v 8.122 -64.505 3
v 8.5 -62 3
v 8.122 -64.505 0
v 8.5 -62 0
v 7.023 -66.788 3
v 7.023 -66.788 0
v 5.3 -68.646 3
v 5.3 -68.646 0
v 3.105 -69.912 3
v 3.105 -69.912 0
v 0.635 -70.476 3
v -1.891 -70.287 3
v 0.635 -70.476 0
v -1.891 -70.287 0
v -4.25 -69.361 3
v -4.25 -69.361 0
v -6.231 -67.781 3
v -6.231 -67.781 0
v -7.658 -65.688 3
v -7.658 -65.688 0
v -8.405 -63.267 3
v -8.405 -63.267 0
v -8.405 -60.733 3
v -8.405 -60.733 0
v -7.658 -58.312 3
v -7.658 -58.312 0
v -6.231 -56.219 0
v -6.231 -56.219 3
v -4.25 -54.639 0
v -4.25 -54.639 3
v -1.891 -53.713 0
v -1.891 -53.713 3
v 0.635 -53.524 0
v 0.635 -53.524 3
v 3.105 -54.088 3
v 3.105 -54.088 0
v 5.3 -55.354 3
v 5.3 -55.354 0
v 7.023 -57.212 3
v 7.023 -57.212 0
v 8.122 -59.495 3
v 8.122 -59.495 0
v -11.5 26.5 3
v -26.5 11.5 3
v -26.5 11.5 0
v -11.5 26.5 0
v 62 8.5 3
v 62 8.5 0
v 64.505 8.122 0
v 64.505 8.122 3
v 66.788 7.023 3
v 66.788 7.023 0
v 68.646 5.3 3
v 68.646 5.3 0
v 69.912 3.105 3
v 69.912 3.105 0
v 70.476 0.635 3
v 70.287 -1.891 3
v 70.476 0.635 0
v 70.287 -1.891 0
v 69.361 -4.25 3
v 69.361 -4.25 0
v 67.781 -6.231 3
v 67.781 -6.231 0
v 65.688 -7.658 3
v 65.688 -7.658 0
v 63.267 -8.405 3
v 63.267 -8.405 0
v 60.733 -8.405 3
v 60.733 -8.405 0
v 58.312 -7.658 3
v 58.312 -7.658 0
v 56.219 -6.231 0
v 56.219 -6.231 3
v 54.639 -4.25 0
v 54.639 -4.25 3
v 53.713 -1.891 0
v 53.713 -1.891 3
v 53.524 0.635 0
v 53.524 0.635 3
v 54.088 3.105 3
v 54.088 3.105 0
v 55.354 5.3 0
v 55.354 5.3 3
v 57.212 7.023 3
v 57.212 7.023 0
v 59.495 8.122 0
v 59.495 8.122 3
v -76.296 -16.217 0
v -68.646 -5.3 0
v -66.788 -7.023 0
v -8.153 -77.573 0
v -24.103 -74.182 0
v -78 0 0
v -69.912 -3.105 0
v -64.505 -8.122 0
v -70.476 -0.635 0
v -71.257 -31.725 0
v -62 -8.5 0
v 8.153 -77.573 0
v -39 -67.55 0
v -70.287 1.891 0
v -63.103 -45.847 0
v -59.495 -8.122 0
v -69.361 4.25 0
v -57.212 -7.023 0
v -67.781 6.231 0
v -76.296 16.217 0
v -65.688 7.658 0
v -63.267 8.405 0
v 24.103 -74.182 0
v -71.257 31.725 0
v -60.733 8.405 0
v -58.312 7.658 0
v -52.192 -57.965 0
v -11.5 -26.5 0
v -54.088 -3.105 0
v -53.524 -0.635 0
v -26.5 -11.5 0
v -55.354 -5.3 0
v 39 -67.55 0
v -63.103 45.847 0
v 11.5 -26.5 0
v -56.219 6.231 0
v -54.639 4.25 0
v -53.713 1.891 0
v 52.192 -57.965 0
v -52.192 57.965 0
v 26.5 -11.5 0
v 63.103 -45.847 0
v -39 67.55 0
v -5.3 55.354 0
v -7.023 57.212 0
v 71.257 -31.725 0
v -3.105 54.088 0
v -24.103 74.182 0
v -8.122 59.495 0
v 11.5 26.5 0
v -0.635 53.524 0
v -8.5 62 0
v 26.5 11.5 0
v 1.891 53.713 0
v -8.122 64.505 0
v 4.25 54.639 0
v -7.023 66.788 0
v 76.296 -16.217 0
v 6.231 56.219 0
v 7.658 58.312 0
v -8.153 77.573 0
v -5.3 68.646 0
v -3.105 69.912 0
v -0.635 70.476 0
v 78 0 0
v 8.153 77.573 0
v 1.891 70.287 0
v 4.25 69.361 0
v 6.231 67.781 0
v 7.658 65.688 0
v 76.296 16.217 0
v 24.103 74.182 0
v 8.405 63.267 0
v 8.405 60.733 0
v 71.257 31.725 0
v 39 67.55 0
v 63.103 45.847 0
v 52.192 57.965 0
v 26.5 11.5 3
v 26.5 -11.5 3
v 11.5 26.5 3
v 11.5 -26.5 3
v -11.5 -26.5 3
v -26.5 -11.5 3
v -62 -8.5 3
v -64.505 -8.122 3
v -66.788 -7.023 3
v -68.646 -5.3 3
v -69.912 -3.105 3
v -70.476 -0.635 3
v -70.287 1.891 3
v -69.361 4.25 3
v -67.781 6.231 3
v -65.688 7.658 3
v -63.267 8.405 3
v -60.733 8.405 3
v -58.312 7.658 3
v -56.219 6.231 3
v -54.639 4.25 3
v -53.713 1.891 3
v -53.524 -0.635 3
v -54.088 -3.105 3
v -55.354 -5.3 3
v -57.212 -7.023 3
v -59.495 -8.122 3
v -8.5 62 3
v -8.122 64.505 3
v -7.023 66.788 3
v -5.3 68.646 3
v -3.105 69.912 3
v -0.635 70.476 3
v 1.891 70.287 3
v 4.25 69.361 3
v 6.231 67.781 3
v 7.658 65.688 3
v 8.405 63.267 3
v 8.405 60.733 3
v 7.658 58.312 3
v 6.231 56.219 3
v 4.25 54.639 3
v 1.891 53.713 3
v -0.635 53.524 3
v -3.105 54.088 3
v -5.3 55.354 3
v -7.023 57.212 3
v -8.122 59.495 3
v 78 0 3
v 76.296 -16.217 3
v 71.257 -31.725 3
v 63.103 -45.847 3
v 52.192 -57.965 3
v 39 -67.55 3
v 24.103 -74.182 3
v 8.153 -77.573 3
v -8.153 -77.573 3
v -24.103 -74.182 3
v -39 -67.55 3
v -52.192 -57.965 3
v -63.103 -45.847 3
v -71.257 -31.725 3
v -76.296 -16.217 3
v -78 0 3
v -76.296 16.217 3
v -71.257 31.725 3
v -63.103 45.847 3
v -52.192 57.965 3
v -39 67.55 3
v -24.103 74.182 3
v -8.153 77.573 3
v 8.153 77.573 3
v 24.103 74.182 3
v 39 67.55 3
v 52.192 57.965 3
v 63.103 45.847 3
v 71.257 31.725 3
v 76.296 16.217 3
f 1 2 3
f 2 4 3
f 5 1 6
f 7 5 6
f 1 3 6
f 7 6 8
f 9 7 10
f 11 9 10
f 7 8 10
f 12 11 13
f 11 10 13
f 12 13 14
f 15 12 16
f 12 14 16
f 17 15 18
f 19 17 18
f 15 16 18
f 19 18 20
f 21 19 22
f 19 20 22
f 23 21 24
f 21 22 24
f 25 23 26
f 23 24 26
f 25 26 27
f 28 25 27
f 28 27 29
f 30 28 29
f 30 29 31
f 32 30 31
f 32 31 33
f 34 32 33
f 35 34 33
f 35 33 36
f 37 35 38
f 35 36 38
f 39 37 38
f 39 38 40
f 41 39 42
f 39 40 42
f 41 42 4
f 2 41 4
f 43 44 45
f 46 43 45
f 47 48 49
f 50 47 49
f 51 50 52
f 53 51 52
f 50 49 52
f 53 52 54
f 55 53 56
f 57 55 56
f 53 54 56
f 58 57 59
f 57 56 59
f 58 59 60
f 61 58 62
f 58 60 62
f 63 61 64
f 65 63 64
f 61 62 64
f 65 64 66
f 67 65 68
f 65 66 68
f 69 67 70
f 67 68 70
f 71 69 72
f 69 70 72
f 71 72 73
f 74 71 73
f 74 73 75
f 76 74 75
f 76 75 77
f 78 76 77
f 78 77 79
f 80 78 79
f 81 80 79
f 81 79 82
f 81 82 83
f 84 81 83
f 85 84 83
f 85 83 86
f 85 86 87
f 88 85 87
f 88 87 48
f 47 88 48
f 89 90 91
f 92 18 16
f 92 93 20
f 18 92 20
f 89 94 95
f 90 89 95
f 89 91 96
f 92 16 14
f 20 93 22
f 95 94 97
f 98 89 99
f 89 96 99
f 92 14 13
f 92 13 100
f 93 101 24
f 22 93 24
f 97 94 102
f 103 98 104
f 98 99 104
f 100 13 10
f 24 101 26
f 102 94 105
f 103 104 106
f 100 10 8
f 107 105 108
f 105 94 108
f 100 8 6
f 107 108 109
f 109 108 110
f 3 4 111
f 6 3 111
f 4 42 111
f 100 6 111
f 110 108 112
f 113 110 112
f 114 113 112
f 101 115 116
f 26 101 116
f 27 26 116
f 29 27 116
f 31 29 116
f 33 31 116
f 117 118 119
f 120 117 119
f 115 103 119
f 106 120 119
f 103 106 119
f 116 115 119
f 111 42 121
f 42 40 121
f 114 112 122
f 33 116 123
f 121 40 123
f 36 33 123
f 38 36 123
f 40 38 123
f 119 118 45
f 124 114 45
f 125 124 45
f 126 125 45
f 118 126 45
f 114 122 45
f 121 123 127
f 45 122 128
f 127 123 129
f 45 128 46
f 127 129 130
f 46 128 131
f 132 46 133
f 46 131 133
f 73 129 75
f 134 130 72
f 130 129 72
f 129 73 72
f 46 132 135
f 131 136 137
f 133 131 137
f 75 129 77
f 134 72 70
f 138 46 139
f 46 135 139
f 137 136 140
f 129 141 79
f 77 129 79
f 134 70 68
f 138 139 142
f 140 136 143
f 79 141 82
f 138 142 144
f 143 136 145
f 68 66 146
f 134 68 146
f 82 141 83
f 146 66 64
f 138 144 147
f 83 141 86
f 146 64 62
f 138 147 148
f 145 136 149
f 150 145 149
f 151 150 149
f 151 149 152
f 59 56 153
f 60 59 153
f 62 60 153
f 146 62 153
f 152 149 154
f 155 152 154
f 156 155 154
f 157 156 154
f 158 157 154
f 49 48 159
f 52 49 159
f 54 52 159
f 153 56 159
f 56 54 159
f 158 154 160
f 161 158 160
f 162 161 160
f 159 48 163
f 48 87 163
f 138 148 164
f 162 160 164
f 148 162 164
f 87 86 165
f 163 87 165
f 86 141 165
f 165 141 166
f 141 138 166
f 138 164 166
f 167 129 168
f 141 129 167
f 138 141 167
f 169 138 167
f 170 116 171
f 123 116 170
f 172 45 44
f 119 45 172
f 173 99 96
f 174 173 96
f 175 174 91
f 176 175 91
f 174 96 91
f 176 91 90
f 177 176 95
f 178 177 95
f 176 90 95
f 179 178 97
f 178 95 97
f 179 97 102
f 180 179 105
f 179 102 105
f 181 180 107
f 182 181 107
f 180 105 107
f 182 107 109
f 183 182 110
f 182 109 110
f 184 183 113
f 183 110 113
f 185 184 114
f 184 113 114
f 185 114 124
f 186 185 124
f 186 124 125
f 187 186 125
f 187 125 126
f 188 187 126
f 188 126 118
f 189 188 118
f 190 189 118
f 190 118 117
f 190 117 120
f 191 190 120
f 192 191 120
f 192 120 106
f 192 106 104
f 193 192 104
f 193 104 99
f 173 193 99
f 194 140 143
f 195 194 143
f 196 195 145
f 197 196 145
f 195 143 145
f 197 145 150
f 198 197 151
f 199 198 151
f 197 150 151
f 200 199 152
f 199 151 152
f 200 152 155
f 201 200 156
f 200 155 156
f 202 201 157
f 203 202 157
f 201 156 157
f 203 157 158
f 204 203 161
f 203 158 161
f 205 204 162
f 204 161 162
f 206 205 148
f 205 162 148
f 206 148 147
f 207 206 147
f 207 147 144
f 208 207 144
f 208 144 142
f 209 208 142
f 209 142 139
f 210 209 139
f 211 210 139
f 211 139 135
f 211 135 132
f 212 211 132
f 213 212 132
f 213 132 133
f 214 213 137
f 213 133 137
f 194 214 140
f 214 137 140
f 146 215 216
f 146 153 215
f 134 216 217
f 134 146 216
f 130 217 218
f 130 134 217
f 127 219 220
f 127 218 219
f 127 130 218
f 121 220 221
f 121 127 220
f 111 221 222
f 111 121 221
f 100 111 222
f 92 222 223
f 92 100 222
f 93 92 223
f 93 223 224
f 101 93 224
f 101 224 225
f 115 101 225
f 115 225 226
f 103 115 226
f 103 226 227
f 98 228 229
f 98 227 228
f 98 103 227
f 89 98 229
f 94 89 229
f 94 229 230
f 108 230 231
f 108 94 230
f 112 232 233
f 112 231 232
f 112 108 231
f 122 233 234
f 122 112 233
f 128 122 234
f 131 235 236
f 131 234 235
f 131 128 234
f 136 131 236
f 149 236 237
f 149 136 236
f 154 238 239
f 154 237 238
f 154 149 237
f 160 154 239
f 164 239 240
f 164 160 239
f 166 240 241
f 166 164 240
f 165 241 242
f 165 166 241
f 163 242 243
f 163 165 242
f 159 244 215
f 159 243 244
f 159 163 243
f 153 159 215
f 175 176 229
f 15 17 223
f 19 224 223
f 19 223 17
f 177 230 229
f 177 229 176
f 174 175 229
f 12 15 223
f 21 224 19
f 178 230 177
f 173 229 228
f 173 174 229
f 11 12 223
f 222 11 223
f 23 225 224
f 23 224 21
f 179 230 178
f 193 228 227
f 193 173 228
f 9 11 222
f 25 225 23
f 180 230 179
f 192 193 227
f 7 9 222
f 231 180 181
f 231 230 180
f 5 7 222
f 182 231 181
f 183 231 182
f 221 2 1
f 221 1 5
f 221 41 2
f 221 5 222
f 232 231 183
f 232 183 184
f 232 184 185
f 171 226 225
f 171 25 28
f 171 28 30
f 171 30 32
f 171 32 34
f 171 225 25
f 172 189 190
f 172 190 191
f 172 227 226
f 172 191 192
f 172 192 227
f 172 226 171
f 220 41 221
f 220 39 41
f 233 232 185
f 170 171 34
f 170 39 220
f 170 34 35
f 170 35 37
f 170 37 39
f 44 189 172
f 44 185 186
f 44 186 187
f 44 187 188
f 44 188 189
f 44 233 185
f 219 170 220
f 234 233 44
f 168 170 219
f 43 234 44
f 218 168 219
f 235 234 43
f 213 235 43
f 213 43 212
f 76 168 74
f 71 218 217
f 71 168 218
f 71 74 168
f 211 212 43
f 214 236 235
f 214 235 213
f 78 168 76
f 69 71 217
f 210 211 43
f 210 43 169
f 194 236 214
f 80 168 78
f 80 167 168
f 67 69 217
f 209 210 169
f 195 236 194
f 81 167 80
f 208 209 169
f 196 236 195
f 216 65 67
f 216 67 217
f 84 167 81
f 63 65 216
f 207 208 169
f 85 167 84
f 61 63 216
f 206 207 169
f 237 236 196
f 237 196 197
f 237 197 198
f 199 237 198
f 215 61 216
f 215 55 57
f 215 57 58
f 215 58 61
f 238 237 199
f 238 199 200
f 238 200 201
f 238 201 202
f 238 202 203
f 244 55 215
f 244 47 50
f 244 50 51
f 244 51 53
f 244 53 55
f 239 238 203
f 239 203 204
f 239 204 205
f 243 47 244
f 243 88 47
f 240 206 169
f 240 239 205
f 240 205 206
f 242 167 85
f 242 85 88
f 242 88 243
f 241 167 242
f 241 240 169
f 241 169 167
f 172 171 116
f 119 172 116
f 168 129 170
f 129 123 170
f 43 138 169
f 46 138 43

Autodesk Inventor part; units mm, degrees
ref_plane "YZ Plane" through (0, 0, 0) normal (1, 0, 0) x (0, 1, 0)
ref_plane "XZ Plane" through (0, 0, 0) normal (0, 1, 0) x (-1, 0, 0)
ref_plane "XY Plane" through (0, 0, 0) normal (0, 0, 1) x (1, 0, 0)
sketch "Sketch1" plane through (0, 0, 0) normal (0, 0, 1) x (1, 0, 0)
  circle A0 centre (0, 0) radius 78
  line L0 (26.5, 26.5) -> (-26.5, 26.5)
  line L1 (-26.5, 26.5) -> (-26.5, -26.5)
  line L2 (-26.5, -26.5) -> (26.5, -26.5)
  line L3 (26.5, -26.5) -> (26.5, 26.5)
  line L4 (26.5, 26.5) -> (-26.5, -26.5) construction
  line L5 (-26.5, 26.5) -> (26.5, -26.5) construction
  dimension "d157" = 156
  dimension "d158" = 53
  dimension "d159" = 53
extrude "Plate5" add sketch "Sketch1" along normal blind 3
sketch "Sketch7" plane through (0, 0, 0) normal (0, 0, -1) x (-1, 0, 0)
  circle A0 centre (0, 62) radius 8.5
  point P0 (0, 0)
  dimension "d160" = 17
  dimension "d161" = 62
extrude "Cut1" cut sketch "Sketch7" against normal blind 3
pattern_circular "Circular Pattern1" count 4 over 360 about axis through (0, 0, -10) along (0, 0, 1) of "Cut1"
chamfer "Corner Chamfer2" distance 15 angle 45 4 edges at (-26.5, -26.5, 1.5) (26.5, -26.5, 1.5) (-26.5, 26.5, 1.5) (26.5, 26.5, 1.5)
properties part number "PNS 1792  funnel FLANGE 1200 50-90_1600" material "Stainless Steel"
